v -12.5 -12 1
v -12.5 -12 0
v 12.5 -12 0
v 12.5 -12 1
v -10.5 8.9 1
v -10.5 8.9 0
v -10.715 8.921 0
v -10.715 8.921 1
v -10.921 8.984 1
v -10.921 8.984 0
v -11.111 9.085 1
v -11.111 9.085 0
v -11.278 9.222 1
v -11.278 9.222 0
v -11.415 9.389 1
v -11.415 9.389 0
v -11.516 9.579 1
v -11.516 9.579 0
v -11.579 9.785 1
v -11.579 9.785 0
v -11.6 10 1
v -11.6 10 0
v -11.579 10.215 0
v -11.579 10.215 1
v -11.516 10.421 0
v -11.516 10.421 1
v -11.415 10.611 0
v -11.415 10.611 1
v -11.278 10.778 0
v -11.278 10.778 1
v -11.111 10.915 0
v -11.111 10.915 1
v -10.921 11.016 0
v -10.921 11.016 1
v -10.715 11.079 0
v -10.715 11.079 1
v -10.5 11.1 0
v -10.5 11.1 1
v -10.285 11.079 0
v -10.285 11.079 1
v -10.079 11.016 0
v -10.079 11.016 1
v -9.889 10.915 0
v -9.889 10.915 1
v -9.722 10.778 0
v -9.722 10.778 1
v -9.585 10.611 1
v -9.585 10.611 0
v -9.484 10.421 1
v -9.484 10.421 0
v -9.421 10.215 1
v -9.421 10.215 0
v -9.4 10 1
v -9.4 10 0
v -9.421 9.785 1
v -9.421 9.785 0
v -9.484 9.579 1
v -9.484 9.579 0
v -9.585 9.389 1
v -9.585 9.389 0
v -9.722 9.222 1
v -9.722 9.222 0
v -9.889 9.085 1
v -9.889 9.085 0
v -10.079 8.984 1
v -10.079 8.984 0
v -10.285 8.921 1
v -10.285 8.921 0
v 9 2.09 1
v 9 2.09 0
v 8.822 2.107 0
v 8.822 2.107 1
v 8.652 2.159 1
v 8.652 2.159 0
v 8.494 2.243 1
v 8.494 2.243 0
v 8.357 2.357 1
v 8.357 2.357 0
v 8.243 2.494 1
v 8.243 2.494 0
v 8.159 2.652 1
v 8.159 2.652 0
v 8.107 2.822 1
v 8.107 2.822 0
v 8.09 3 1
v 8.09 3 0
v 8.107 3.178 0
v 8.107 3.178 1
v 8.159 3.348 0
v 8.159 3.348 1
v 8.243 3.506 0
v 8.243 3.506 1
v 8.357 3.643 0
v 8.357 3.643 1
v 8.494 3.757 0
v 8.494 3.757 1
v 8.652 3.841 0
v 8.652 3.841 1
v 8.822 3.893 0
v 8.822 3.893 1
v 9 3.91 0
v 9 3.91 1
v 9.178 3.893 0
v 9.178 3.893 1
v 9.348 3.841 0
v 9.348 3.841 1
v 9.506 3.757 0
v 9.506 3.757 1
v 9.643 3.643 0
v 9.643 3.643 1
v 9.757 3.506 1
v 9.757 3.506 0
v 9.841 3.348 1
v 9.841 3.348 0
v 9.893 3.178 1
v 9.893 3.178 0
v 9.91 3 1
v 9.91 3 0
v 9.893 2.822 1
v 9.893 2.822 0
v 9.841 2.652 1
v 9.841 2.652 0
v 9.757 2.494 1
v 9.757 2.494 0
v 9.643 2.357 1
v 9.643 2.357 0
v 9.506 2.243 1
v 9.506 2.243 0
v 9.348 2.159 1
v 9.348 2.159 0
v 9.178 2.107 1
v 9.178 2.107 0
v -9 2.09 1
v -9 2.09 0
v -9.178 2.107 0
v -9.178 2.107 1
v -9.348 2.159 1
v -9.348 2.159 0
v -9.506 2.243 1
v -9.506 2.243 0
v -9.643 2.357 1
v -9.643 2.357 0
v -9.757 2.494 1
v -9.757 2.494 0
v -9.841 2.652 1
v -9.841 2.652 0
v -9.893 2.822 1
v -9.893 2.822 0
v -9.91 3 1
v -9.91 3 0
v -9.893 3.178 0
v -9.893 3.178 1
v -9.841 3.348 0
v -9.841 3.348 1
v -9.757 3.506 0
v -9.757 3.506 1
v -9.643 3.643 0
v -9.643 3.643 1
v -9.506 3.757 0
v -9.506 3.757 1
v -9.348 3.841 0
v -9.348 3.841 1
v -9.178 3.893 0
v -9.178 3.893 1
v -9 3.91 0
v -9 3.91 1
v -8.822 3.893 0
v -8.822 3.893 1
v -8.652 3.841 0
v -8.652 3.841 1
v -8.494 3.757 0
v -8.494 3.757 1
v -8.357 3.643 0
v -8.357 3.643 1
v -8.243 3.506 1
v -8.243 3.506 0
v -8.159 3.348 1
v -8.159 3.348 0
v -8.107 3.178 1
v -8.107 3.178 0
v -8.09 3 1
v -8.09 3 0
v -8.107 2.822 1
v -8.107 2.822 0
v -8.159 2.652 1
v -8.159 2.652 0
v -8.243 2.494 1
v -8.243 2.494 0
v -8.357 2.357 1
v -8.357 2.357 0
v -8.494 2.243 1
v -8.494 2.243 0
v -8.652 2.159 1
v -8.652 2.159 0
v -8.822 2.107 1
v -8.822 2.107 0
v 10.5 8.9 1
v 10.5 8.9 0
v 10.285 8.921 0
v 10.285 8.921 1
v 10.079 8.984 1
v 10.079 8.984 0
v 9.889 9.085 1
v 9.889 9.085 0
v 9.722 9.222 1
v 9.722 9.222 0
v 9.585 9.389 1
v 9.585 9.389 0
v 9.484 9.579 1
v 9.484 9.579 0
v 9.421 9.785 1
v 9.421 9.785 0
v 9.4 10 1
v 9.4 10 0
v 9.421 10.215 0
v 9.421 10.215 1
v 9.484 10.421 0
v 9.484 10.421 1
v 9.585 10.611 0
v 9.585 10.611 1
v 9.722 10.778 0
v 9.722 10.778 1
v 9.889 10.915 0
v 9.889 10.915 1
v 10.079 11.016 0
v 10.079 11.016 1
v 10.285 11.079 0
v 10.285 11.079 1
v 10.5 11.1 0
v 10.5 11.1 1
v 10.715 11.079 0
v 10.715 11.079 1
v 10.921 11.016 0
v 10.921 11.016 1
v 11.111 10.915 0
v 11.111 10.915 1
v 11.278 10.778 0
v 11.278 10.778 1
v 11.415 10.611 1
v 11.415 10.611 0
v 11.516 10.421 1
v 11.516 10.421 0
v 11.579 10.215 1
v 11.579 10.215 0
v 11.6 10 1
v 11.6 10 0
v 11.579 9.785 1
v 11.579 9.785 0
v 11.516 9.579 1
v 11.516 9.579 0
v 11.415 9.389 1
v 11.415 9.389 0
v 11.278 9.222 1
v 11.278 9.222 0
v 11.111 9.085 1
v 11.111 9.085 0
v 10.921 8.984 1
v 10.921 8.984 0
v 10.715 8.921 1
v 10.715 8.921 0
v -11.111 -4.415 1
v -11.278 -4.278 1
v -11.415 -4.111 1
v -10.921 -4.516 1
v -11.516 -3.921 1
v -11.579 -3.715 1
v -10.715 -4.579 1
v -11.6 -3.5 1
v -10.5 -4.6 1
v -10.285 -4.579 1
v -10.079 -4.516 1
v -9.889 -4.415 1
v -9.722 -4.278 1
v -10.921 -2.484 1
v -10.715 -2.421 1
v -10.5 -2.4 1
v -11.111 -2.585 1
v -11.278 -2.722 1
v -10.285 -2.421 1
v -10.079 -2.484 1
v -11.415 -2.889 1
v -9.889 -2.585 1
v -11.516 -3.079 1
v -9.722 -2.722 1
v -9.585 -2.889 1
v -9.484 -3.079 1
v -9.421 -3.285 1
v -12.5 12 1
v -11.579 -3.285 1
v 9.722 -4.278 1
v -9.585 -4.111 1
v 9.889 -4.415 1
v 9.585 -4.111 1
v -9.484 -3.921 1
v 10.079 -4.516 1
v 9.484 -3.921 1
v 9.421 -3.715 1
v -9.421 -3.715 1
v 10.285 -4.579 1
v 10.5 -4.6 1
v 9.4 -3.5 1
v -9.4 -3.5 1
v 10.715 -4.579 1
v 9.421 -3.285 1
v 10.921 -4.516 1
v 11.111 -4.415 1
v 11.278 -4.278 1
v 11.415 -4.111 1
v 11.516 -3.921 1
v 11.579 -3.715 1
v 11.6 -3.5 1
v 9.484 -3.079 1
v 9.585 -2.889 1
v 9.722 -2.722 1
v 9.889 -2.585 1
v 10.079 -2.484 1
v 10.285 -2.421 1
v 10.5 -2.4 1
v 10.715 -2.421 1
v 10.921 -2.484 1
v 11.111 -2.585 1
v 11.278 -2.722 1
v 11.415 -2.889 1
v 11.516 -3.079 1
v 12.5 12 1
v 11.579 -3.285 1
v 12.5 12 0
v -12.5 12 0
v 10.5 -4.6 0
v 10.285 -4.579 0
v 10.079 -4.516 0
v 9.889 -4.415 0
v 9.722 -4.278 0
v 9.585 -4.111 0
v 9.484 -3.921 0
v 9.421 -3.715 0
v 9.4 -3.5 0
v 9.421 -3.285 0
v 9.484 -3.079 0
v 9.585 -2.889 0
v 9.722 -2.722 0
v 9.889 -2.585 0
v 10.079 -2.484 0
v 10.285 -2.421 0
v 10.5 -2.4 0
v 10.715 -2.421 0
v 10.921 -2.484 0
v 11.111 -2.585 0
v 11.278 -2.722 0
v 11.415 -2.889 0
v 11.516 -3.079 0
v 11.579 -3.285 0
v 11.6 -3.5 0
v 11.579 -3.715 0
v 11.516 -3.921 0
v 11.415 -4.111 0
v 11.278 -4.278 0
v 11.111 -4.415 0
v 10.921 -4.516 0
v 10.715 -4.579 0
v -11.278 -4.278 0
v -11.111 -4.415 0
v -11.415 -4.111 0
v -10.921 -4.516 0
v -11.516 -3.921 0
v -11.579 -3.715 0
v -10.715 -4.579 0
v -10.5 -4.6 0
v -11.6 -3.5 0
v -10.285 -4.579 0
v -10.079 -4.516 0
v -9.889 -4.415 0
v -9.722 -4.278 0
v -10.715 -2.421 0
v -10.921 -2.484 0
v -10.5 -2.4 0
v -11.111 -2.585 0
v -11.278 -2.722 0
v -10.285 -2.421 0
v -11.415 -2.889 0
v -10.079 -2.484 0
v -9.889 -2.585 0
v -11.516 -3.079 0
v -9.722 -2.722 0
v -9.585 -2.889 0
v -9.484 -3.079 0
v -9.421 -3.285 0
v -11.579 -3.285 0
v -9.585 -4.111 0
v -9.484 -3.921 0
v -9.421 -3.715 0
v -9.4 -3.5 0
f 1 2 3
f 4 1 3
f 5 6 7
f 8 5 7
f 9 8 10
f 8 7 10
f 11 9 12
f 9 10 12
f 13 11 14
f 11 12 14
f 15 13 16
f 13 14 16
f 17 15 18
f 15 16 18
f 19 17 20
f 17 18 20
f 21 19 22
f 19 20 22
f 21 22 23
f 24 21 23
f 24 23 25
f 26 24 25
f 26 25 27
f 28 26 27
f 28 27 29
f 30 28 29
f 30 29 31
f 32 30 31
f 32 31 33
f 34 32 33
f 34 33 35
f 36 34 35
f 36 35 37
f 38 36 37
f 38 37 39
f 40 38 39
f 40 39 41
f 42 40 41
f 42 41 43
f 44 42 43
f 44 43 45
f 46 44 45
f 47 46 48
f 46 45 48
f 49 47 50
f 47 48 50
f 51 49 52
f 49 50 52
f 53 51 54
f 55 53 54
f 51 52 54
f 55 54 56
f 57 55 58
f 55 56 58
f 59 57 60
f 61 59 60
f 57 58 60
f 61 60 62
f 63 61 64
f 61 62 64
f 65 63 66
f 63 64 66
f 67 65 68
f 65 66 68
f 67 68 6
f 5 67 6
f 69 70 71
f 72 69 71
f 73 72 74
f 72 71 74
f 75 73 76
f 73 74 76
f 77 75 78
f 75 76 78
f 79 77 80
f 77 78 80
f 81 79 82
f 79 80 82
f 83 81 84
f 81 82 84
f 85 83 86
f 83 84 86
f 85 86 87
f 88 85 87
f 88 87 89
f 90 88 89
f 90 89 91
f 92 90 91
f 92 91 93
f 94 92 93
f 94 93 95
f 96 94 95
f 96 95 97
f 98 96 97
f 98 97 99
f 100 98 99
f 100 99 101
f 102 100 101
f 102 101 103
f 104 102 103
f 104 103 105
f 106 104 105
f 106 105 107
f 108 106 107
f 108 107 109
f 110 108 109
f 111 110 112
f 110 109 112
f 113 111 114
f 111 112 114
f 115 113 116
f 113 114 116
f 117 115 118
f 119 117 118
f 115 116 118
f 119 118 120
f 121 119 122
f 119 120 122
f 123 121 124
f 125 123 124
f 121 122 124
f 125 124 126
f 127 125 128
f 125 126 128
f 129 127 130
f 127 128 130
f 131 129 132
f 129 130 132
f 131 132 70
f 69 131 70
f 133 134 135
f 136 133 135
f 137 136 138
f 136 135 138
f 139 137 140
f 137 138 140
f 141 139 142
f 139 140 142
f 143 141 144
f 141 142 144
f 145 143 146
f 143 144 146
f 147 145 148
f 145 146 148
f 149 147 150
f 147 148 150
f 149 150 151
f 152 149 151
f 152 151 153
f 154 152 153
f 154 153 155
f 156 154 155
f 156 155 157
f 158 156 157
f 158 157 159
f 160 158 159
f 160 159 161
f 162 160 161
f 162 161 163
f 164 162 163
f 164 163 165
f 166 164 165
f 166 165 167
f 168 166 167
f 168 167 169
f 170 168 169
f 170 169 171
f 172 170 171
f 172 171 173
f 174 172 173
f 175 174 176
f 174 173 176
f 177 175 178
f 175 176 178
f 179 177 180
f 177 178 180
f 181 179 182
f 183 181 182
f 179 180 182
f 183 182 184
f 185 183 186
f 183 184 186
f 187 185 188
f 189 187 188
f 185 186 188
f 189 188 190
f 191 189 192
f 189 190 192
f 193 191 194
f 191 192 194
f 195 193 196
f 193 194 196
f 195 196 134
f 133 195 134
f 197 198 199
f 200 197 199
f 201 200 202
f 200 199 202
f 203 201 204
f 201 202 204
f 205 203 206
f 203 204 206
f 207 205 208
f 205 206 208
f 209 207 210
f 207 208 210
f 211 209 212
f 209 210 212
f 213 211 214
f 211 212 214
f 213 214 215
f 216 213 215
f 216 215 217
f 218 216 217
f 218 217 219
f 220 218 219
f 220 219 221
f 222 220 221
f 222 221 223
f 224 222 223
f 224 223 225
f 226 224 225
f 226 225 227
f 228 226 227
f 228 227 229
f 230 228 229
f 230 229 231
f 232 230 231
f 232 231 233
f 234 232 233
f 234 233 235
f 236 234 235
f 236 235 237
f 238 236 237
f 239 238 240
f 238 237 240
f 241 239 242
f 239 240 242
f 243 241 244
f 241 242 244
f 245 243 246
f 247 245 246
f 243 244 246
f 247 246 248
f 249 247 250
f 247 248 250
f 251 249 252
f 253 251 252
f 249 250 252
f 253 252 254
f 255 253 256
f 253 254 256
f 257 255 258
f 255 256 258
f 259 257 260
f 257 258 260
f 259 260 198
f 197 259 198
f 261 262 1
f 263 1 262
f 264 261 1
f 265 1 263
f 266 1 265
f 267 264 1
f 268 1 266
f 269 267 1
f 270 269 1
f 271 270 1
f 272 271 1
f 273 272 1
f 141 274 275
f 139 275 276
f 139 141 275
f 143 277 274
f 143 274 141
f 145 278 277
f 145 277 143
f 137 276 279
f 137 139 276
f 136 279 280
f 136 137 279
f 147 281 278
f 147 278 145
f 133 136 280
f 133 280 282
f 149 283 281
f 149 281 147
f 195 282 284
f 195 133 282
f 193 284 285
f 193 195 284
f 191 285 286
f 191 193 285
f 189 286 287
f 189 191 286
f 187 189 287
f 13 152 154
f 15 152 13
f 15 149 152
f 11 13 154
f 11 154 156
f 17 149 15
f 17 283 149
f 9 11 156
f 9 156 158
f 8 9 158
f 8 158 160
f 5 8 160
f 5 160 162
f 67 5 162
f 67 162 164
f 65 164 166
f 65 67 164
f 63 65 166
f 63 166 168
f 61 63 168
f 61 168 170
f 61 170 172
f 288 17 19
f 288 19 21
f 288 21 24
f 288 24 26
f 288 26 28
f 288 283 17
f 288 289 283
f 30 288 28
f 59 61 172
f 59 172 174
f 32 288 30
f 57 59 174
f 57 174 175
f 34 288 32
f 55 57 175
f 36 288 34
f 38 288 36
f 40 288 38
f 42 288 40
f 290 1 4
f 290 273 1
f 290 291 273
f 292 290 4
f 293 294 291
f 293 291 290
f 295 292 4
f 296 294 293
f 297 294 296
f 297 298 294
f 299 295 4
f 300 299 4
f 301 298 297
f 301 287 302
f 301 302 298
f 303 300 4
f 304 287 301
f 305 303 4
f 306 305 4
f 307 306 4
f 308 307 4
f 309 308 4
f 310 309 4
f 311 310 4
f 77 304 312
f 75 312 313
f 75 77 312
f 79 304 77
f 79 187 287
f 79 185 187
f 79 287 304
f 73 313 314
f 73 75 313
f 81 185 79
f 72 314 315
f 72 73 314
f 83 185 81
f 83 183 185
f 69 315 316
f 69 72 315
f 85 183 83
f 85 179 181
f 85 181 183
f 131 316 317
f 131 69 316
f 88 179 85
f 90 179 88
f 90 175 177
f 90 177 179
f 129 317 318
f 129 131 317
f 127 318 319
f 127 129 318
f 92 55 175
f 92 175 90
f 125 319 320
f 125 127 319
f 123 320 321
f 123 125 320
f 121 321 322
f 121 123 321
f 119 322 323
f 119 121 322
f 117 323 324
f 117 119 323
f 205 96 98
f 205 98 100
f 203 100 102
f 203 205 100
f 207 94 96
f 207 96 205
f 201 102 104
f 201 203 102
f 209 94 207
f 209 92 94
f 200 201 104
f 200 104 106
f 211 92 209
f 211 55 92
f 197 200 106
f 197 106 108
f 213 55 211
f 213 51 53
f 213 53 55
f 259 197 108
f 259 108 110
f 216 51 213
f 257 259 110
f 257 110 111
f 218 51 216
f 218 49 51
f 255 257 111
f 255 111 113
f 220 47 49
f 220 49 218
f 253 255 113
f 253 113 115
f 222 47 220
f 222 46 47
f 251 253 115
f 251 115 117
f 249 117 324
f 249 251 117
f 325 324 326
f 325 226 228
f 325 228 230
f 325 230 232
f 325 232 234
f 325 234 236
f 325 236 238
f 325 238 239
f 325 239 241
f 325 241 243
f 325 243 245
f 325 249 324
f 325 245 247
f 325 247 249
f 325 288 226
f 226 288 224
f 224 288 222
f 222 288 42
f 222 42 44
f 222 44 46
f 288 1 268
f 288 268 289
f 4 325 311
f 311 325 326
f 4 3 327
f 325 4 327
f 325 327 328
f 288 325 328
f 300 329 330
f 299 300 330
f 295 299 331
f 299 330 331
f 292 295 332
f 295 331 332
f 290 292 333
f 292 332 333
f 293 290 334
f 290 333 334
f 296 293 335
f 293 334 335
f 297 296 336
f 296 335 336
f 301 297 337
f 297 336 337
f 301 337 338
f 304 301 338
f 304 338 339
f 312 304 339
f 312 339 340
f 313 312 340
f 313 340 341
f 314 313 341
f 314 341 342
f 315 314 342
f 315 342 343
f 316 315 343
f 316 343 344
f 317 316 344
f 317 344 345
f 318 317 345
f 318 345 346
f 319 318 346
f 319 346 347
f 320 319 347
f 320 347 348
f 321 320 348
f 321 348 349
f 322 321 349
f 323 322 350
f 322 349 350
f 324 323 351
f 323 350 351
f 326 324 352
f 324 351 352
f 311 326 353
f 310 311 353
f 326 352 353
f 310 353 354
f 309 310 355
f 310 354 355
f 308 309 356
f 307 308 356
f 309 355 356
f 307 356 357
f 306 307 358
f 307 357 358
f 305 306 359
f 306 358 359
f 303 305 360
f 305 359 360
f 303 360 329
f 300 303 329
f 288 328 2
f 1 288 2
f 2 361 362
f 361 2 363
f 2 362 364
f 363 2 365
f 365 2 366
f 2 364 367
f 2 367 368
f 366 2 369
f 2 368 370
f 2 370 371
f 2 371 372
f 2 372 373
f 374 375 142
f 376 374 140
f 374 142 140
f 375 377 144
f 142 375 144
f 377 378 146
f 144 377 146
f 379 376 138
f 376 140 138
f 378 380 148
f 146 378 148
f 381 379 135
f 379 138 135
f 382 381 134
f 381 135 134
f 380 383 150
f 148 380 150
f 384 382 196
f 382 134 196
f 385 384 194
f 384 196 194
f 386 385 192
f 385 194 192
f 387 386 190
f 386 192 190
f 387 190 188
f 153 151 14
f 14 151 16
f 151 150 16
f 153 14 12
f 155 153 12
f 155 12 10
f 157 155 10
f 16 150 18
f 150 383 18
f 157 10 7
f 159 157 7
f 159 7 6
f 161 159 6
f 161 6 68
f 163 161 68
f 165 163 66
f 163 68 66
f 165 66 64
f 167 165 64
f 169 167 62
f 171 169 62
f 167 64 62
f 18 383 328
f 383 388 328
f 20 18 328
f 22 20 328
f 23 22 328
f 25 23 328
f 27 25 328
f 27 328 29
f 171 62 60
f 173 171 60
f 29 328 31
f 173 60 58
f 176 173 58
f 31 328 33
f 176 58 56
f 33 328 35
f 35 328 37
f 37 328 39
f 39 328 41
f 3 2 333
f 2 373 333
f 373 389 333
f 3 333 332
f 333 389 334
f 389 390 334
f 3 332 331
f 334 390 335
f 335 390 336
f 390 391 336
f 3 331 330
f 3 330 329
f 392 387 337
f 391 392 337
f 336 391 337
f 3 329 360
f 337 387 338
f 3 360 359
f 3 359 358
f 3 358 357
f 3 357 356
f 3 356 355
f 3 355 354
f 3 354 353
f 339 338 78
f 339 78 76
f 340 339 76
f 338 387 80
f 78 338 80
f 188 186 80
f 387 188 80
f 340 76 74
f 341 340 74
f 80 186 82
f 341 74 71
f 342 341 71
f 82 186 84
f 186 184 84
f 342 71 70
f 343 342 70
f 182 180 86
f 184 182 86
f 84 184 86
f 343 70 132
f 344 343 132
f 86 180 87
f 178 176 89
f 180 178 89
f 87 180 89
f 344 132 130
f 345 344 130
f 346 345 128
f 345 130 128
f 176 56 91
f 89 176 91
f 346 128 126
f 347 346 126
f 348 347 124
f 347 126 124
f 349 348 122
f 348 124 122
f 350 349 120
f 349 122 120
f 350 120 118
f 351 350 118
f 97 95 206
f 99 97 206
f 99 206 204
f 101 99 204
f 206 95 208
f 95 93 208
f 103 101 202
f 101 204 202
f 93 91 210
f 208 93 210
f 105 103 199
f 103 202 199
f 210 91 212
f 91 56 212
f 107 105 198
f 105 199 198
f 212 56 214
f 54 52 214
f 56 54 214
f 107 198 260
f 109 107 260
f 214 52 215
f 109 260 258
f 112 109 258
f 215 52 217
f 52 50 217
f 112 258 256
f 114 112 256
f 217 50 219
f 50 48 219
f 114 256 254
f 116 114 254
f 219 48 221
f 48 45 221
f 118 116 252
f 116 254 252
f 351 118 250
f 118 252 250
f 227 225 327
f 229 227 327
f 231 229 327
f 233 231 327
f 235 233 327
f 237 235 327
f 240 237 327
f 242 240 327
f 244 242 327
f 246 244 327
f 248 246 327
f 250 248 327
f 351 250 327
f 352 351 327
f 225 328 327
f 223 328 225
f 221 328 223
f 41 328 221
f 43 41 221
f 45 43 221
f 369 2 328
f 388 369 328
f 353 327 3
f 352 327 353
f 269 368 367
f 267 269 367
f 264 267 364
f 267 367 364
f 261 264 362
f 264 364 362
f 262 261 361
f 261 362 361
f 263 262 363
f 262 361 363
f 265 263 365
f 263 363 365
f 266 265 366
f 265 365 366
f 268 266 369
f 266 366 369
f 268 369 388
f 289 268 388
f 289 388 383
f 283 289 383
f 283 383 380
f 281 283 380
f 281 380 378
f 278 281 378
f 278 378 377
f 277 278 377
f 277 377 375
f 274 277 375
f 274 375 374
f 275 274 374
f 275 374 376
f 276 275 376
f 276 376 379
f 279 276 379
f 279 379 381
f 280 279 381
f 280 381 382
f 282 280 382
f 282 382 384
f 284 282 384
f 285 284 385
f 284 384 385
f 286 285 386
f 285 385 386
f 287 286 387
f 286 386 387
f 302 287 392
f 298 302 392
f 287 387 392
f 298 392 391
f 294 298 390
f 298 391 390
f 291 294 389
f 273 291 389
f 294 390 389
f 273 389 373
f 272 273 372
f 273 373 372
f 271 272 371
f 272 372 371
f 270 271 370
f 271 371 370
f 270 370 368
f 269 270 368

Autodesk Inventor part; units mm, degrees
ref_plane "YZ Plane" through (0, 0, 0) normal (1, 0, 0) x (0, 1, 0)
ref_plane "XZ Plane" through (0, 0, 0) normal (0, 1, 0) x (-1, 0, 0)
ref_plane "XY Plane" through (0, 0, 0) normal (0, 0, 1) x (1, 0, 0)
sketch "Skizze1" plane through (0, 0, 0) normal (0, 0, 1) x (1, 0, 0)
  line L0 (-12.5, -12) -> (12.5, -12)
  line L1 (12.5, -12) -> (12.5, 12)
  line L2 (12.5, 12) -> (-12.5, 12)
  line L3 (-12.5, 12) -> (-12.5, -12)
  line L4 (-12.5, -12) -> (12.5, 12) construction
  line L5 (12.5, -12) -> (-12.5, 12) construction
  point P0 (0, 0)
  dimension "d0" = 25
  dimension "d1" = 24
extrude "Extrusion1" add sketch "Skizze1" along normal blind 1
sketch "Skizze2" plane through (0, 0, 1) normal (0, 0, 1) x (1, 0, 0)
  line L0 (-12.5, -12) -> (12.5, -12) projected
  line L1 (12.5, -12) -> (12.5, 12) projected
  line L2 (12.5, 12) -> (-12.5, 12) projected
  line L3 (-12.5, 12) -> (-12.5, -12) projected
  line L4 (12.5, 12) -> (-12.5, 12) construction
  line L5 (0, 12) -> (0, -12) construction
  line L6 (-12.5, -12) -> (12.5, -12) construction
  point P0 (0, 0)
  point P1 (-10.5, 10)
  point P2 (10.5, 10)
  point P3 (10.5, -3.5)
  point P4 (-10.5, -3.5)
  dimension "d4" = 2
  dimension "d5" = 2
  dimension "d6" = 8.5
  dimension "d7" = 2
hole "Bohrung1" at (-10.5, 10, 1) at (10.5, 10, 1) at (10.5, -3.5, 1) at (-10.5, -3.5, 1) direction (0, 0, -1) diameter 2.2 end through all
sketch "Skizze3" plane through (0, 0, 1) normal (0, 0, 1) x (1, 0, 0)
  circle A0 centre (10.5, -3.5) radius 1.1 projected
  circle A1 centre (-10.5, 10) radius 1.1 projected
  circle A2 centre (10.5, 10) radius 1.1 projected
  circle A3 centre (-10.5, -3.5) radius 1.1 projected
  line L0 (-12.5, -12) -> (12.5, -12) projected
  line L1 (12.5, -12) -> (12.5, 12) projected
  line L2 (12.5, 12) -> (-12.5, 12) projected
  line L3 (-12.5, 12) -> (-12.5, -12) projected
  line L4 (0, 12) -> (0, -12) construction
  point P0 (0, 0)
  point P1 (-9, 3)
  point P2 (9, 3)
  dimension "d16" = 9
  dimension "d17" = 18
hole "Bohrung2" at (-9, 3, 1) at (9, 3, 1) direction (0, 0, -1) diameter 1.82 end through all
properties part number "Waveshare Kamera PCB 24x25" material "Phenolharz"
